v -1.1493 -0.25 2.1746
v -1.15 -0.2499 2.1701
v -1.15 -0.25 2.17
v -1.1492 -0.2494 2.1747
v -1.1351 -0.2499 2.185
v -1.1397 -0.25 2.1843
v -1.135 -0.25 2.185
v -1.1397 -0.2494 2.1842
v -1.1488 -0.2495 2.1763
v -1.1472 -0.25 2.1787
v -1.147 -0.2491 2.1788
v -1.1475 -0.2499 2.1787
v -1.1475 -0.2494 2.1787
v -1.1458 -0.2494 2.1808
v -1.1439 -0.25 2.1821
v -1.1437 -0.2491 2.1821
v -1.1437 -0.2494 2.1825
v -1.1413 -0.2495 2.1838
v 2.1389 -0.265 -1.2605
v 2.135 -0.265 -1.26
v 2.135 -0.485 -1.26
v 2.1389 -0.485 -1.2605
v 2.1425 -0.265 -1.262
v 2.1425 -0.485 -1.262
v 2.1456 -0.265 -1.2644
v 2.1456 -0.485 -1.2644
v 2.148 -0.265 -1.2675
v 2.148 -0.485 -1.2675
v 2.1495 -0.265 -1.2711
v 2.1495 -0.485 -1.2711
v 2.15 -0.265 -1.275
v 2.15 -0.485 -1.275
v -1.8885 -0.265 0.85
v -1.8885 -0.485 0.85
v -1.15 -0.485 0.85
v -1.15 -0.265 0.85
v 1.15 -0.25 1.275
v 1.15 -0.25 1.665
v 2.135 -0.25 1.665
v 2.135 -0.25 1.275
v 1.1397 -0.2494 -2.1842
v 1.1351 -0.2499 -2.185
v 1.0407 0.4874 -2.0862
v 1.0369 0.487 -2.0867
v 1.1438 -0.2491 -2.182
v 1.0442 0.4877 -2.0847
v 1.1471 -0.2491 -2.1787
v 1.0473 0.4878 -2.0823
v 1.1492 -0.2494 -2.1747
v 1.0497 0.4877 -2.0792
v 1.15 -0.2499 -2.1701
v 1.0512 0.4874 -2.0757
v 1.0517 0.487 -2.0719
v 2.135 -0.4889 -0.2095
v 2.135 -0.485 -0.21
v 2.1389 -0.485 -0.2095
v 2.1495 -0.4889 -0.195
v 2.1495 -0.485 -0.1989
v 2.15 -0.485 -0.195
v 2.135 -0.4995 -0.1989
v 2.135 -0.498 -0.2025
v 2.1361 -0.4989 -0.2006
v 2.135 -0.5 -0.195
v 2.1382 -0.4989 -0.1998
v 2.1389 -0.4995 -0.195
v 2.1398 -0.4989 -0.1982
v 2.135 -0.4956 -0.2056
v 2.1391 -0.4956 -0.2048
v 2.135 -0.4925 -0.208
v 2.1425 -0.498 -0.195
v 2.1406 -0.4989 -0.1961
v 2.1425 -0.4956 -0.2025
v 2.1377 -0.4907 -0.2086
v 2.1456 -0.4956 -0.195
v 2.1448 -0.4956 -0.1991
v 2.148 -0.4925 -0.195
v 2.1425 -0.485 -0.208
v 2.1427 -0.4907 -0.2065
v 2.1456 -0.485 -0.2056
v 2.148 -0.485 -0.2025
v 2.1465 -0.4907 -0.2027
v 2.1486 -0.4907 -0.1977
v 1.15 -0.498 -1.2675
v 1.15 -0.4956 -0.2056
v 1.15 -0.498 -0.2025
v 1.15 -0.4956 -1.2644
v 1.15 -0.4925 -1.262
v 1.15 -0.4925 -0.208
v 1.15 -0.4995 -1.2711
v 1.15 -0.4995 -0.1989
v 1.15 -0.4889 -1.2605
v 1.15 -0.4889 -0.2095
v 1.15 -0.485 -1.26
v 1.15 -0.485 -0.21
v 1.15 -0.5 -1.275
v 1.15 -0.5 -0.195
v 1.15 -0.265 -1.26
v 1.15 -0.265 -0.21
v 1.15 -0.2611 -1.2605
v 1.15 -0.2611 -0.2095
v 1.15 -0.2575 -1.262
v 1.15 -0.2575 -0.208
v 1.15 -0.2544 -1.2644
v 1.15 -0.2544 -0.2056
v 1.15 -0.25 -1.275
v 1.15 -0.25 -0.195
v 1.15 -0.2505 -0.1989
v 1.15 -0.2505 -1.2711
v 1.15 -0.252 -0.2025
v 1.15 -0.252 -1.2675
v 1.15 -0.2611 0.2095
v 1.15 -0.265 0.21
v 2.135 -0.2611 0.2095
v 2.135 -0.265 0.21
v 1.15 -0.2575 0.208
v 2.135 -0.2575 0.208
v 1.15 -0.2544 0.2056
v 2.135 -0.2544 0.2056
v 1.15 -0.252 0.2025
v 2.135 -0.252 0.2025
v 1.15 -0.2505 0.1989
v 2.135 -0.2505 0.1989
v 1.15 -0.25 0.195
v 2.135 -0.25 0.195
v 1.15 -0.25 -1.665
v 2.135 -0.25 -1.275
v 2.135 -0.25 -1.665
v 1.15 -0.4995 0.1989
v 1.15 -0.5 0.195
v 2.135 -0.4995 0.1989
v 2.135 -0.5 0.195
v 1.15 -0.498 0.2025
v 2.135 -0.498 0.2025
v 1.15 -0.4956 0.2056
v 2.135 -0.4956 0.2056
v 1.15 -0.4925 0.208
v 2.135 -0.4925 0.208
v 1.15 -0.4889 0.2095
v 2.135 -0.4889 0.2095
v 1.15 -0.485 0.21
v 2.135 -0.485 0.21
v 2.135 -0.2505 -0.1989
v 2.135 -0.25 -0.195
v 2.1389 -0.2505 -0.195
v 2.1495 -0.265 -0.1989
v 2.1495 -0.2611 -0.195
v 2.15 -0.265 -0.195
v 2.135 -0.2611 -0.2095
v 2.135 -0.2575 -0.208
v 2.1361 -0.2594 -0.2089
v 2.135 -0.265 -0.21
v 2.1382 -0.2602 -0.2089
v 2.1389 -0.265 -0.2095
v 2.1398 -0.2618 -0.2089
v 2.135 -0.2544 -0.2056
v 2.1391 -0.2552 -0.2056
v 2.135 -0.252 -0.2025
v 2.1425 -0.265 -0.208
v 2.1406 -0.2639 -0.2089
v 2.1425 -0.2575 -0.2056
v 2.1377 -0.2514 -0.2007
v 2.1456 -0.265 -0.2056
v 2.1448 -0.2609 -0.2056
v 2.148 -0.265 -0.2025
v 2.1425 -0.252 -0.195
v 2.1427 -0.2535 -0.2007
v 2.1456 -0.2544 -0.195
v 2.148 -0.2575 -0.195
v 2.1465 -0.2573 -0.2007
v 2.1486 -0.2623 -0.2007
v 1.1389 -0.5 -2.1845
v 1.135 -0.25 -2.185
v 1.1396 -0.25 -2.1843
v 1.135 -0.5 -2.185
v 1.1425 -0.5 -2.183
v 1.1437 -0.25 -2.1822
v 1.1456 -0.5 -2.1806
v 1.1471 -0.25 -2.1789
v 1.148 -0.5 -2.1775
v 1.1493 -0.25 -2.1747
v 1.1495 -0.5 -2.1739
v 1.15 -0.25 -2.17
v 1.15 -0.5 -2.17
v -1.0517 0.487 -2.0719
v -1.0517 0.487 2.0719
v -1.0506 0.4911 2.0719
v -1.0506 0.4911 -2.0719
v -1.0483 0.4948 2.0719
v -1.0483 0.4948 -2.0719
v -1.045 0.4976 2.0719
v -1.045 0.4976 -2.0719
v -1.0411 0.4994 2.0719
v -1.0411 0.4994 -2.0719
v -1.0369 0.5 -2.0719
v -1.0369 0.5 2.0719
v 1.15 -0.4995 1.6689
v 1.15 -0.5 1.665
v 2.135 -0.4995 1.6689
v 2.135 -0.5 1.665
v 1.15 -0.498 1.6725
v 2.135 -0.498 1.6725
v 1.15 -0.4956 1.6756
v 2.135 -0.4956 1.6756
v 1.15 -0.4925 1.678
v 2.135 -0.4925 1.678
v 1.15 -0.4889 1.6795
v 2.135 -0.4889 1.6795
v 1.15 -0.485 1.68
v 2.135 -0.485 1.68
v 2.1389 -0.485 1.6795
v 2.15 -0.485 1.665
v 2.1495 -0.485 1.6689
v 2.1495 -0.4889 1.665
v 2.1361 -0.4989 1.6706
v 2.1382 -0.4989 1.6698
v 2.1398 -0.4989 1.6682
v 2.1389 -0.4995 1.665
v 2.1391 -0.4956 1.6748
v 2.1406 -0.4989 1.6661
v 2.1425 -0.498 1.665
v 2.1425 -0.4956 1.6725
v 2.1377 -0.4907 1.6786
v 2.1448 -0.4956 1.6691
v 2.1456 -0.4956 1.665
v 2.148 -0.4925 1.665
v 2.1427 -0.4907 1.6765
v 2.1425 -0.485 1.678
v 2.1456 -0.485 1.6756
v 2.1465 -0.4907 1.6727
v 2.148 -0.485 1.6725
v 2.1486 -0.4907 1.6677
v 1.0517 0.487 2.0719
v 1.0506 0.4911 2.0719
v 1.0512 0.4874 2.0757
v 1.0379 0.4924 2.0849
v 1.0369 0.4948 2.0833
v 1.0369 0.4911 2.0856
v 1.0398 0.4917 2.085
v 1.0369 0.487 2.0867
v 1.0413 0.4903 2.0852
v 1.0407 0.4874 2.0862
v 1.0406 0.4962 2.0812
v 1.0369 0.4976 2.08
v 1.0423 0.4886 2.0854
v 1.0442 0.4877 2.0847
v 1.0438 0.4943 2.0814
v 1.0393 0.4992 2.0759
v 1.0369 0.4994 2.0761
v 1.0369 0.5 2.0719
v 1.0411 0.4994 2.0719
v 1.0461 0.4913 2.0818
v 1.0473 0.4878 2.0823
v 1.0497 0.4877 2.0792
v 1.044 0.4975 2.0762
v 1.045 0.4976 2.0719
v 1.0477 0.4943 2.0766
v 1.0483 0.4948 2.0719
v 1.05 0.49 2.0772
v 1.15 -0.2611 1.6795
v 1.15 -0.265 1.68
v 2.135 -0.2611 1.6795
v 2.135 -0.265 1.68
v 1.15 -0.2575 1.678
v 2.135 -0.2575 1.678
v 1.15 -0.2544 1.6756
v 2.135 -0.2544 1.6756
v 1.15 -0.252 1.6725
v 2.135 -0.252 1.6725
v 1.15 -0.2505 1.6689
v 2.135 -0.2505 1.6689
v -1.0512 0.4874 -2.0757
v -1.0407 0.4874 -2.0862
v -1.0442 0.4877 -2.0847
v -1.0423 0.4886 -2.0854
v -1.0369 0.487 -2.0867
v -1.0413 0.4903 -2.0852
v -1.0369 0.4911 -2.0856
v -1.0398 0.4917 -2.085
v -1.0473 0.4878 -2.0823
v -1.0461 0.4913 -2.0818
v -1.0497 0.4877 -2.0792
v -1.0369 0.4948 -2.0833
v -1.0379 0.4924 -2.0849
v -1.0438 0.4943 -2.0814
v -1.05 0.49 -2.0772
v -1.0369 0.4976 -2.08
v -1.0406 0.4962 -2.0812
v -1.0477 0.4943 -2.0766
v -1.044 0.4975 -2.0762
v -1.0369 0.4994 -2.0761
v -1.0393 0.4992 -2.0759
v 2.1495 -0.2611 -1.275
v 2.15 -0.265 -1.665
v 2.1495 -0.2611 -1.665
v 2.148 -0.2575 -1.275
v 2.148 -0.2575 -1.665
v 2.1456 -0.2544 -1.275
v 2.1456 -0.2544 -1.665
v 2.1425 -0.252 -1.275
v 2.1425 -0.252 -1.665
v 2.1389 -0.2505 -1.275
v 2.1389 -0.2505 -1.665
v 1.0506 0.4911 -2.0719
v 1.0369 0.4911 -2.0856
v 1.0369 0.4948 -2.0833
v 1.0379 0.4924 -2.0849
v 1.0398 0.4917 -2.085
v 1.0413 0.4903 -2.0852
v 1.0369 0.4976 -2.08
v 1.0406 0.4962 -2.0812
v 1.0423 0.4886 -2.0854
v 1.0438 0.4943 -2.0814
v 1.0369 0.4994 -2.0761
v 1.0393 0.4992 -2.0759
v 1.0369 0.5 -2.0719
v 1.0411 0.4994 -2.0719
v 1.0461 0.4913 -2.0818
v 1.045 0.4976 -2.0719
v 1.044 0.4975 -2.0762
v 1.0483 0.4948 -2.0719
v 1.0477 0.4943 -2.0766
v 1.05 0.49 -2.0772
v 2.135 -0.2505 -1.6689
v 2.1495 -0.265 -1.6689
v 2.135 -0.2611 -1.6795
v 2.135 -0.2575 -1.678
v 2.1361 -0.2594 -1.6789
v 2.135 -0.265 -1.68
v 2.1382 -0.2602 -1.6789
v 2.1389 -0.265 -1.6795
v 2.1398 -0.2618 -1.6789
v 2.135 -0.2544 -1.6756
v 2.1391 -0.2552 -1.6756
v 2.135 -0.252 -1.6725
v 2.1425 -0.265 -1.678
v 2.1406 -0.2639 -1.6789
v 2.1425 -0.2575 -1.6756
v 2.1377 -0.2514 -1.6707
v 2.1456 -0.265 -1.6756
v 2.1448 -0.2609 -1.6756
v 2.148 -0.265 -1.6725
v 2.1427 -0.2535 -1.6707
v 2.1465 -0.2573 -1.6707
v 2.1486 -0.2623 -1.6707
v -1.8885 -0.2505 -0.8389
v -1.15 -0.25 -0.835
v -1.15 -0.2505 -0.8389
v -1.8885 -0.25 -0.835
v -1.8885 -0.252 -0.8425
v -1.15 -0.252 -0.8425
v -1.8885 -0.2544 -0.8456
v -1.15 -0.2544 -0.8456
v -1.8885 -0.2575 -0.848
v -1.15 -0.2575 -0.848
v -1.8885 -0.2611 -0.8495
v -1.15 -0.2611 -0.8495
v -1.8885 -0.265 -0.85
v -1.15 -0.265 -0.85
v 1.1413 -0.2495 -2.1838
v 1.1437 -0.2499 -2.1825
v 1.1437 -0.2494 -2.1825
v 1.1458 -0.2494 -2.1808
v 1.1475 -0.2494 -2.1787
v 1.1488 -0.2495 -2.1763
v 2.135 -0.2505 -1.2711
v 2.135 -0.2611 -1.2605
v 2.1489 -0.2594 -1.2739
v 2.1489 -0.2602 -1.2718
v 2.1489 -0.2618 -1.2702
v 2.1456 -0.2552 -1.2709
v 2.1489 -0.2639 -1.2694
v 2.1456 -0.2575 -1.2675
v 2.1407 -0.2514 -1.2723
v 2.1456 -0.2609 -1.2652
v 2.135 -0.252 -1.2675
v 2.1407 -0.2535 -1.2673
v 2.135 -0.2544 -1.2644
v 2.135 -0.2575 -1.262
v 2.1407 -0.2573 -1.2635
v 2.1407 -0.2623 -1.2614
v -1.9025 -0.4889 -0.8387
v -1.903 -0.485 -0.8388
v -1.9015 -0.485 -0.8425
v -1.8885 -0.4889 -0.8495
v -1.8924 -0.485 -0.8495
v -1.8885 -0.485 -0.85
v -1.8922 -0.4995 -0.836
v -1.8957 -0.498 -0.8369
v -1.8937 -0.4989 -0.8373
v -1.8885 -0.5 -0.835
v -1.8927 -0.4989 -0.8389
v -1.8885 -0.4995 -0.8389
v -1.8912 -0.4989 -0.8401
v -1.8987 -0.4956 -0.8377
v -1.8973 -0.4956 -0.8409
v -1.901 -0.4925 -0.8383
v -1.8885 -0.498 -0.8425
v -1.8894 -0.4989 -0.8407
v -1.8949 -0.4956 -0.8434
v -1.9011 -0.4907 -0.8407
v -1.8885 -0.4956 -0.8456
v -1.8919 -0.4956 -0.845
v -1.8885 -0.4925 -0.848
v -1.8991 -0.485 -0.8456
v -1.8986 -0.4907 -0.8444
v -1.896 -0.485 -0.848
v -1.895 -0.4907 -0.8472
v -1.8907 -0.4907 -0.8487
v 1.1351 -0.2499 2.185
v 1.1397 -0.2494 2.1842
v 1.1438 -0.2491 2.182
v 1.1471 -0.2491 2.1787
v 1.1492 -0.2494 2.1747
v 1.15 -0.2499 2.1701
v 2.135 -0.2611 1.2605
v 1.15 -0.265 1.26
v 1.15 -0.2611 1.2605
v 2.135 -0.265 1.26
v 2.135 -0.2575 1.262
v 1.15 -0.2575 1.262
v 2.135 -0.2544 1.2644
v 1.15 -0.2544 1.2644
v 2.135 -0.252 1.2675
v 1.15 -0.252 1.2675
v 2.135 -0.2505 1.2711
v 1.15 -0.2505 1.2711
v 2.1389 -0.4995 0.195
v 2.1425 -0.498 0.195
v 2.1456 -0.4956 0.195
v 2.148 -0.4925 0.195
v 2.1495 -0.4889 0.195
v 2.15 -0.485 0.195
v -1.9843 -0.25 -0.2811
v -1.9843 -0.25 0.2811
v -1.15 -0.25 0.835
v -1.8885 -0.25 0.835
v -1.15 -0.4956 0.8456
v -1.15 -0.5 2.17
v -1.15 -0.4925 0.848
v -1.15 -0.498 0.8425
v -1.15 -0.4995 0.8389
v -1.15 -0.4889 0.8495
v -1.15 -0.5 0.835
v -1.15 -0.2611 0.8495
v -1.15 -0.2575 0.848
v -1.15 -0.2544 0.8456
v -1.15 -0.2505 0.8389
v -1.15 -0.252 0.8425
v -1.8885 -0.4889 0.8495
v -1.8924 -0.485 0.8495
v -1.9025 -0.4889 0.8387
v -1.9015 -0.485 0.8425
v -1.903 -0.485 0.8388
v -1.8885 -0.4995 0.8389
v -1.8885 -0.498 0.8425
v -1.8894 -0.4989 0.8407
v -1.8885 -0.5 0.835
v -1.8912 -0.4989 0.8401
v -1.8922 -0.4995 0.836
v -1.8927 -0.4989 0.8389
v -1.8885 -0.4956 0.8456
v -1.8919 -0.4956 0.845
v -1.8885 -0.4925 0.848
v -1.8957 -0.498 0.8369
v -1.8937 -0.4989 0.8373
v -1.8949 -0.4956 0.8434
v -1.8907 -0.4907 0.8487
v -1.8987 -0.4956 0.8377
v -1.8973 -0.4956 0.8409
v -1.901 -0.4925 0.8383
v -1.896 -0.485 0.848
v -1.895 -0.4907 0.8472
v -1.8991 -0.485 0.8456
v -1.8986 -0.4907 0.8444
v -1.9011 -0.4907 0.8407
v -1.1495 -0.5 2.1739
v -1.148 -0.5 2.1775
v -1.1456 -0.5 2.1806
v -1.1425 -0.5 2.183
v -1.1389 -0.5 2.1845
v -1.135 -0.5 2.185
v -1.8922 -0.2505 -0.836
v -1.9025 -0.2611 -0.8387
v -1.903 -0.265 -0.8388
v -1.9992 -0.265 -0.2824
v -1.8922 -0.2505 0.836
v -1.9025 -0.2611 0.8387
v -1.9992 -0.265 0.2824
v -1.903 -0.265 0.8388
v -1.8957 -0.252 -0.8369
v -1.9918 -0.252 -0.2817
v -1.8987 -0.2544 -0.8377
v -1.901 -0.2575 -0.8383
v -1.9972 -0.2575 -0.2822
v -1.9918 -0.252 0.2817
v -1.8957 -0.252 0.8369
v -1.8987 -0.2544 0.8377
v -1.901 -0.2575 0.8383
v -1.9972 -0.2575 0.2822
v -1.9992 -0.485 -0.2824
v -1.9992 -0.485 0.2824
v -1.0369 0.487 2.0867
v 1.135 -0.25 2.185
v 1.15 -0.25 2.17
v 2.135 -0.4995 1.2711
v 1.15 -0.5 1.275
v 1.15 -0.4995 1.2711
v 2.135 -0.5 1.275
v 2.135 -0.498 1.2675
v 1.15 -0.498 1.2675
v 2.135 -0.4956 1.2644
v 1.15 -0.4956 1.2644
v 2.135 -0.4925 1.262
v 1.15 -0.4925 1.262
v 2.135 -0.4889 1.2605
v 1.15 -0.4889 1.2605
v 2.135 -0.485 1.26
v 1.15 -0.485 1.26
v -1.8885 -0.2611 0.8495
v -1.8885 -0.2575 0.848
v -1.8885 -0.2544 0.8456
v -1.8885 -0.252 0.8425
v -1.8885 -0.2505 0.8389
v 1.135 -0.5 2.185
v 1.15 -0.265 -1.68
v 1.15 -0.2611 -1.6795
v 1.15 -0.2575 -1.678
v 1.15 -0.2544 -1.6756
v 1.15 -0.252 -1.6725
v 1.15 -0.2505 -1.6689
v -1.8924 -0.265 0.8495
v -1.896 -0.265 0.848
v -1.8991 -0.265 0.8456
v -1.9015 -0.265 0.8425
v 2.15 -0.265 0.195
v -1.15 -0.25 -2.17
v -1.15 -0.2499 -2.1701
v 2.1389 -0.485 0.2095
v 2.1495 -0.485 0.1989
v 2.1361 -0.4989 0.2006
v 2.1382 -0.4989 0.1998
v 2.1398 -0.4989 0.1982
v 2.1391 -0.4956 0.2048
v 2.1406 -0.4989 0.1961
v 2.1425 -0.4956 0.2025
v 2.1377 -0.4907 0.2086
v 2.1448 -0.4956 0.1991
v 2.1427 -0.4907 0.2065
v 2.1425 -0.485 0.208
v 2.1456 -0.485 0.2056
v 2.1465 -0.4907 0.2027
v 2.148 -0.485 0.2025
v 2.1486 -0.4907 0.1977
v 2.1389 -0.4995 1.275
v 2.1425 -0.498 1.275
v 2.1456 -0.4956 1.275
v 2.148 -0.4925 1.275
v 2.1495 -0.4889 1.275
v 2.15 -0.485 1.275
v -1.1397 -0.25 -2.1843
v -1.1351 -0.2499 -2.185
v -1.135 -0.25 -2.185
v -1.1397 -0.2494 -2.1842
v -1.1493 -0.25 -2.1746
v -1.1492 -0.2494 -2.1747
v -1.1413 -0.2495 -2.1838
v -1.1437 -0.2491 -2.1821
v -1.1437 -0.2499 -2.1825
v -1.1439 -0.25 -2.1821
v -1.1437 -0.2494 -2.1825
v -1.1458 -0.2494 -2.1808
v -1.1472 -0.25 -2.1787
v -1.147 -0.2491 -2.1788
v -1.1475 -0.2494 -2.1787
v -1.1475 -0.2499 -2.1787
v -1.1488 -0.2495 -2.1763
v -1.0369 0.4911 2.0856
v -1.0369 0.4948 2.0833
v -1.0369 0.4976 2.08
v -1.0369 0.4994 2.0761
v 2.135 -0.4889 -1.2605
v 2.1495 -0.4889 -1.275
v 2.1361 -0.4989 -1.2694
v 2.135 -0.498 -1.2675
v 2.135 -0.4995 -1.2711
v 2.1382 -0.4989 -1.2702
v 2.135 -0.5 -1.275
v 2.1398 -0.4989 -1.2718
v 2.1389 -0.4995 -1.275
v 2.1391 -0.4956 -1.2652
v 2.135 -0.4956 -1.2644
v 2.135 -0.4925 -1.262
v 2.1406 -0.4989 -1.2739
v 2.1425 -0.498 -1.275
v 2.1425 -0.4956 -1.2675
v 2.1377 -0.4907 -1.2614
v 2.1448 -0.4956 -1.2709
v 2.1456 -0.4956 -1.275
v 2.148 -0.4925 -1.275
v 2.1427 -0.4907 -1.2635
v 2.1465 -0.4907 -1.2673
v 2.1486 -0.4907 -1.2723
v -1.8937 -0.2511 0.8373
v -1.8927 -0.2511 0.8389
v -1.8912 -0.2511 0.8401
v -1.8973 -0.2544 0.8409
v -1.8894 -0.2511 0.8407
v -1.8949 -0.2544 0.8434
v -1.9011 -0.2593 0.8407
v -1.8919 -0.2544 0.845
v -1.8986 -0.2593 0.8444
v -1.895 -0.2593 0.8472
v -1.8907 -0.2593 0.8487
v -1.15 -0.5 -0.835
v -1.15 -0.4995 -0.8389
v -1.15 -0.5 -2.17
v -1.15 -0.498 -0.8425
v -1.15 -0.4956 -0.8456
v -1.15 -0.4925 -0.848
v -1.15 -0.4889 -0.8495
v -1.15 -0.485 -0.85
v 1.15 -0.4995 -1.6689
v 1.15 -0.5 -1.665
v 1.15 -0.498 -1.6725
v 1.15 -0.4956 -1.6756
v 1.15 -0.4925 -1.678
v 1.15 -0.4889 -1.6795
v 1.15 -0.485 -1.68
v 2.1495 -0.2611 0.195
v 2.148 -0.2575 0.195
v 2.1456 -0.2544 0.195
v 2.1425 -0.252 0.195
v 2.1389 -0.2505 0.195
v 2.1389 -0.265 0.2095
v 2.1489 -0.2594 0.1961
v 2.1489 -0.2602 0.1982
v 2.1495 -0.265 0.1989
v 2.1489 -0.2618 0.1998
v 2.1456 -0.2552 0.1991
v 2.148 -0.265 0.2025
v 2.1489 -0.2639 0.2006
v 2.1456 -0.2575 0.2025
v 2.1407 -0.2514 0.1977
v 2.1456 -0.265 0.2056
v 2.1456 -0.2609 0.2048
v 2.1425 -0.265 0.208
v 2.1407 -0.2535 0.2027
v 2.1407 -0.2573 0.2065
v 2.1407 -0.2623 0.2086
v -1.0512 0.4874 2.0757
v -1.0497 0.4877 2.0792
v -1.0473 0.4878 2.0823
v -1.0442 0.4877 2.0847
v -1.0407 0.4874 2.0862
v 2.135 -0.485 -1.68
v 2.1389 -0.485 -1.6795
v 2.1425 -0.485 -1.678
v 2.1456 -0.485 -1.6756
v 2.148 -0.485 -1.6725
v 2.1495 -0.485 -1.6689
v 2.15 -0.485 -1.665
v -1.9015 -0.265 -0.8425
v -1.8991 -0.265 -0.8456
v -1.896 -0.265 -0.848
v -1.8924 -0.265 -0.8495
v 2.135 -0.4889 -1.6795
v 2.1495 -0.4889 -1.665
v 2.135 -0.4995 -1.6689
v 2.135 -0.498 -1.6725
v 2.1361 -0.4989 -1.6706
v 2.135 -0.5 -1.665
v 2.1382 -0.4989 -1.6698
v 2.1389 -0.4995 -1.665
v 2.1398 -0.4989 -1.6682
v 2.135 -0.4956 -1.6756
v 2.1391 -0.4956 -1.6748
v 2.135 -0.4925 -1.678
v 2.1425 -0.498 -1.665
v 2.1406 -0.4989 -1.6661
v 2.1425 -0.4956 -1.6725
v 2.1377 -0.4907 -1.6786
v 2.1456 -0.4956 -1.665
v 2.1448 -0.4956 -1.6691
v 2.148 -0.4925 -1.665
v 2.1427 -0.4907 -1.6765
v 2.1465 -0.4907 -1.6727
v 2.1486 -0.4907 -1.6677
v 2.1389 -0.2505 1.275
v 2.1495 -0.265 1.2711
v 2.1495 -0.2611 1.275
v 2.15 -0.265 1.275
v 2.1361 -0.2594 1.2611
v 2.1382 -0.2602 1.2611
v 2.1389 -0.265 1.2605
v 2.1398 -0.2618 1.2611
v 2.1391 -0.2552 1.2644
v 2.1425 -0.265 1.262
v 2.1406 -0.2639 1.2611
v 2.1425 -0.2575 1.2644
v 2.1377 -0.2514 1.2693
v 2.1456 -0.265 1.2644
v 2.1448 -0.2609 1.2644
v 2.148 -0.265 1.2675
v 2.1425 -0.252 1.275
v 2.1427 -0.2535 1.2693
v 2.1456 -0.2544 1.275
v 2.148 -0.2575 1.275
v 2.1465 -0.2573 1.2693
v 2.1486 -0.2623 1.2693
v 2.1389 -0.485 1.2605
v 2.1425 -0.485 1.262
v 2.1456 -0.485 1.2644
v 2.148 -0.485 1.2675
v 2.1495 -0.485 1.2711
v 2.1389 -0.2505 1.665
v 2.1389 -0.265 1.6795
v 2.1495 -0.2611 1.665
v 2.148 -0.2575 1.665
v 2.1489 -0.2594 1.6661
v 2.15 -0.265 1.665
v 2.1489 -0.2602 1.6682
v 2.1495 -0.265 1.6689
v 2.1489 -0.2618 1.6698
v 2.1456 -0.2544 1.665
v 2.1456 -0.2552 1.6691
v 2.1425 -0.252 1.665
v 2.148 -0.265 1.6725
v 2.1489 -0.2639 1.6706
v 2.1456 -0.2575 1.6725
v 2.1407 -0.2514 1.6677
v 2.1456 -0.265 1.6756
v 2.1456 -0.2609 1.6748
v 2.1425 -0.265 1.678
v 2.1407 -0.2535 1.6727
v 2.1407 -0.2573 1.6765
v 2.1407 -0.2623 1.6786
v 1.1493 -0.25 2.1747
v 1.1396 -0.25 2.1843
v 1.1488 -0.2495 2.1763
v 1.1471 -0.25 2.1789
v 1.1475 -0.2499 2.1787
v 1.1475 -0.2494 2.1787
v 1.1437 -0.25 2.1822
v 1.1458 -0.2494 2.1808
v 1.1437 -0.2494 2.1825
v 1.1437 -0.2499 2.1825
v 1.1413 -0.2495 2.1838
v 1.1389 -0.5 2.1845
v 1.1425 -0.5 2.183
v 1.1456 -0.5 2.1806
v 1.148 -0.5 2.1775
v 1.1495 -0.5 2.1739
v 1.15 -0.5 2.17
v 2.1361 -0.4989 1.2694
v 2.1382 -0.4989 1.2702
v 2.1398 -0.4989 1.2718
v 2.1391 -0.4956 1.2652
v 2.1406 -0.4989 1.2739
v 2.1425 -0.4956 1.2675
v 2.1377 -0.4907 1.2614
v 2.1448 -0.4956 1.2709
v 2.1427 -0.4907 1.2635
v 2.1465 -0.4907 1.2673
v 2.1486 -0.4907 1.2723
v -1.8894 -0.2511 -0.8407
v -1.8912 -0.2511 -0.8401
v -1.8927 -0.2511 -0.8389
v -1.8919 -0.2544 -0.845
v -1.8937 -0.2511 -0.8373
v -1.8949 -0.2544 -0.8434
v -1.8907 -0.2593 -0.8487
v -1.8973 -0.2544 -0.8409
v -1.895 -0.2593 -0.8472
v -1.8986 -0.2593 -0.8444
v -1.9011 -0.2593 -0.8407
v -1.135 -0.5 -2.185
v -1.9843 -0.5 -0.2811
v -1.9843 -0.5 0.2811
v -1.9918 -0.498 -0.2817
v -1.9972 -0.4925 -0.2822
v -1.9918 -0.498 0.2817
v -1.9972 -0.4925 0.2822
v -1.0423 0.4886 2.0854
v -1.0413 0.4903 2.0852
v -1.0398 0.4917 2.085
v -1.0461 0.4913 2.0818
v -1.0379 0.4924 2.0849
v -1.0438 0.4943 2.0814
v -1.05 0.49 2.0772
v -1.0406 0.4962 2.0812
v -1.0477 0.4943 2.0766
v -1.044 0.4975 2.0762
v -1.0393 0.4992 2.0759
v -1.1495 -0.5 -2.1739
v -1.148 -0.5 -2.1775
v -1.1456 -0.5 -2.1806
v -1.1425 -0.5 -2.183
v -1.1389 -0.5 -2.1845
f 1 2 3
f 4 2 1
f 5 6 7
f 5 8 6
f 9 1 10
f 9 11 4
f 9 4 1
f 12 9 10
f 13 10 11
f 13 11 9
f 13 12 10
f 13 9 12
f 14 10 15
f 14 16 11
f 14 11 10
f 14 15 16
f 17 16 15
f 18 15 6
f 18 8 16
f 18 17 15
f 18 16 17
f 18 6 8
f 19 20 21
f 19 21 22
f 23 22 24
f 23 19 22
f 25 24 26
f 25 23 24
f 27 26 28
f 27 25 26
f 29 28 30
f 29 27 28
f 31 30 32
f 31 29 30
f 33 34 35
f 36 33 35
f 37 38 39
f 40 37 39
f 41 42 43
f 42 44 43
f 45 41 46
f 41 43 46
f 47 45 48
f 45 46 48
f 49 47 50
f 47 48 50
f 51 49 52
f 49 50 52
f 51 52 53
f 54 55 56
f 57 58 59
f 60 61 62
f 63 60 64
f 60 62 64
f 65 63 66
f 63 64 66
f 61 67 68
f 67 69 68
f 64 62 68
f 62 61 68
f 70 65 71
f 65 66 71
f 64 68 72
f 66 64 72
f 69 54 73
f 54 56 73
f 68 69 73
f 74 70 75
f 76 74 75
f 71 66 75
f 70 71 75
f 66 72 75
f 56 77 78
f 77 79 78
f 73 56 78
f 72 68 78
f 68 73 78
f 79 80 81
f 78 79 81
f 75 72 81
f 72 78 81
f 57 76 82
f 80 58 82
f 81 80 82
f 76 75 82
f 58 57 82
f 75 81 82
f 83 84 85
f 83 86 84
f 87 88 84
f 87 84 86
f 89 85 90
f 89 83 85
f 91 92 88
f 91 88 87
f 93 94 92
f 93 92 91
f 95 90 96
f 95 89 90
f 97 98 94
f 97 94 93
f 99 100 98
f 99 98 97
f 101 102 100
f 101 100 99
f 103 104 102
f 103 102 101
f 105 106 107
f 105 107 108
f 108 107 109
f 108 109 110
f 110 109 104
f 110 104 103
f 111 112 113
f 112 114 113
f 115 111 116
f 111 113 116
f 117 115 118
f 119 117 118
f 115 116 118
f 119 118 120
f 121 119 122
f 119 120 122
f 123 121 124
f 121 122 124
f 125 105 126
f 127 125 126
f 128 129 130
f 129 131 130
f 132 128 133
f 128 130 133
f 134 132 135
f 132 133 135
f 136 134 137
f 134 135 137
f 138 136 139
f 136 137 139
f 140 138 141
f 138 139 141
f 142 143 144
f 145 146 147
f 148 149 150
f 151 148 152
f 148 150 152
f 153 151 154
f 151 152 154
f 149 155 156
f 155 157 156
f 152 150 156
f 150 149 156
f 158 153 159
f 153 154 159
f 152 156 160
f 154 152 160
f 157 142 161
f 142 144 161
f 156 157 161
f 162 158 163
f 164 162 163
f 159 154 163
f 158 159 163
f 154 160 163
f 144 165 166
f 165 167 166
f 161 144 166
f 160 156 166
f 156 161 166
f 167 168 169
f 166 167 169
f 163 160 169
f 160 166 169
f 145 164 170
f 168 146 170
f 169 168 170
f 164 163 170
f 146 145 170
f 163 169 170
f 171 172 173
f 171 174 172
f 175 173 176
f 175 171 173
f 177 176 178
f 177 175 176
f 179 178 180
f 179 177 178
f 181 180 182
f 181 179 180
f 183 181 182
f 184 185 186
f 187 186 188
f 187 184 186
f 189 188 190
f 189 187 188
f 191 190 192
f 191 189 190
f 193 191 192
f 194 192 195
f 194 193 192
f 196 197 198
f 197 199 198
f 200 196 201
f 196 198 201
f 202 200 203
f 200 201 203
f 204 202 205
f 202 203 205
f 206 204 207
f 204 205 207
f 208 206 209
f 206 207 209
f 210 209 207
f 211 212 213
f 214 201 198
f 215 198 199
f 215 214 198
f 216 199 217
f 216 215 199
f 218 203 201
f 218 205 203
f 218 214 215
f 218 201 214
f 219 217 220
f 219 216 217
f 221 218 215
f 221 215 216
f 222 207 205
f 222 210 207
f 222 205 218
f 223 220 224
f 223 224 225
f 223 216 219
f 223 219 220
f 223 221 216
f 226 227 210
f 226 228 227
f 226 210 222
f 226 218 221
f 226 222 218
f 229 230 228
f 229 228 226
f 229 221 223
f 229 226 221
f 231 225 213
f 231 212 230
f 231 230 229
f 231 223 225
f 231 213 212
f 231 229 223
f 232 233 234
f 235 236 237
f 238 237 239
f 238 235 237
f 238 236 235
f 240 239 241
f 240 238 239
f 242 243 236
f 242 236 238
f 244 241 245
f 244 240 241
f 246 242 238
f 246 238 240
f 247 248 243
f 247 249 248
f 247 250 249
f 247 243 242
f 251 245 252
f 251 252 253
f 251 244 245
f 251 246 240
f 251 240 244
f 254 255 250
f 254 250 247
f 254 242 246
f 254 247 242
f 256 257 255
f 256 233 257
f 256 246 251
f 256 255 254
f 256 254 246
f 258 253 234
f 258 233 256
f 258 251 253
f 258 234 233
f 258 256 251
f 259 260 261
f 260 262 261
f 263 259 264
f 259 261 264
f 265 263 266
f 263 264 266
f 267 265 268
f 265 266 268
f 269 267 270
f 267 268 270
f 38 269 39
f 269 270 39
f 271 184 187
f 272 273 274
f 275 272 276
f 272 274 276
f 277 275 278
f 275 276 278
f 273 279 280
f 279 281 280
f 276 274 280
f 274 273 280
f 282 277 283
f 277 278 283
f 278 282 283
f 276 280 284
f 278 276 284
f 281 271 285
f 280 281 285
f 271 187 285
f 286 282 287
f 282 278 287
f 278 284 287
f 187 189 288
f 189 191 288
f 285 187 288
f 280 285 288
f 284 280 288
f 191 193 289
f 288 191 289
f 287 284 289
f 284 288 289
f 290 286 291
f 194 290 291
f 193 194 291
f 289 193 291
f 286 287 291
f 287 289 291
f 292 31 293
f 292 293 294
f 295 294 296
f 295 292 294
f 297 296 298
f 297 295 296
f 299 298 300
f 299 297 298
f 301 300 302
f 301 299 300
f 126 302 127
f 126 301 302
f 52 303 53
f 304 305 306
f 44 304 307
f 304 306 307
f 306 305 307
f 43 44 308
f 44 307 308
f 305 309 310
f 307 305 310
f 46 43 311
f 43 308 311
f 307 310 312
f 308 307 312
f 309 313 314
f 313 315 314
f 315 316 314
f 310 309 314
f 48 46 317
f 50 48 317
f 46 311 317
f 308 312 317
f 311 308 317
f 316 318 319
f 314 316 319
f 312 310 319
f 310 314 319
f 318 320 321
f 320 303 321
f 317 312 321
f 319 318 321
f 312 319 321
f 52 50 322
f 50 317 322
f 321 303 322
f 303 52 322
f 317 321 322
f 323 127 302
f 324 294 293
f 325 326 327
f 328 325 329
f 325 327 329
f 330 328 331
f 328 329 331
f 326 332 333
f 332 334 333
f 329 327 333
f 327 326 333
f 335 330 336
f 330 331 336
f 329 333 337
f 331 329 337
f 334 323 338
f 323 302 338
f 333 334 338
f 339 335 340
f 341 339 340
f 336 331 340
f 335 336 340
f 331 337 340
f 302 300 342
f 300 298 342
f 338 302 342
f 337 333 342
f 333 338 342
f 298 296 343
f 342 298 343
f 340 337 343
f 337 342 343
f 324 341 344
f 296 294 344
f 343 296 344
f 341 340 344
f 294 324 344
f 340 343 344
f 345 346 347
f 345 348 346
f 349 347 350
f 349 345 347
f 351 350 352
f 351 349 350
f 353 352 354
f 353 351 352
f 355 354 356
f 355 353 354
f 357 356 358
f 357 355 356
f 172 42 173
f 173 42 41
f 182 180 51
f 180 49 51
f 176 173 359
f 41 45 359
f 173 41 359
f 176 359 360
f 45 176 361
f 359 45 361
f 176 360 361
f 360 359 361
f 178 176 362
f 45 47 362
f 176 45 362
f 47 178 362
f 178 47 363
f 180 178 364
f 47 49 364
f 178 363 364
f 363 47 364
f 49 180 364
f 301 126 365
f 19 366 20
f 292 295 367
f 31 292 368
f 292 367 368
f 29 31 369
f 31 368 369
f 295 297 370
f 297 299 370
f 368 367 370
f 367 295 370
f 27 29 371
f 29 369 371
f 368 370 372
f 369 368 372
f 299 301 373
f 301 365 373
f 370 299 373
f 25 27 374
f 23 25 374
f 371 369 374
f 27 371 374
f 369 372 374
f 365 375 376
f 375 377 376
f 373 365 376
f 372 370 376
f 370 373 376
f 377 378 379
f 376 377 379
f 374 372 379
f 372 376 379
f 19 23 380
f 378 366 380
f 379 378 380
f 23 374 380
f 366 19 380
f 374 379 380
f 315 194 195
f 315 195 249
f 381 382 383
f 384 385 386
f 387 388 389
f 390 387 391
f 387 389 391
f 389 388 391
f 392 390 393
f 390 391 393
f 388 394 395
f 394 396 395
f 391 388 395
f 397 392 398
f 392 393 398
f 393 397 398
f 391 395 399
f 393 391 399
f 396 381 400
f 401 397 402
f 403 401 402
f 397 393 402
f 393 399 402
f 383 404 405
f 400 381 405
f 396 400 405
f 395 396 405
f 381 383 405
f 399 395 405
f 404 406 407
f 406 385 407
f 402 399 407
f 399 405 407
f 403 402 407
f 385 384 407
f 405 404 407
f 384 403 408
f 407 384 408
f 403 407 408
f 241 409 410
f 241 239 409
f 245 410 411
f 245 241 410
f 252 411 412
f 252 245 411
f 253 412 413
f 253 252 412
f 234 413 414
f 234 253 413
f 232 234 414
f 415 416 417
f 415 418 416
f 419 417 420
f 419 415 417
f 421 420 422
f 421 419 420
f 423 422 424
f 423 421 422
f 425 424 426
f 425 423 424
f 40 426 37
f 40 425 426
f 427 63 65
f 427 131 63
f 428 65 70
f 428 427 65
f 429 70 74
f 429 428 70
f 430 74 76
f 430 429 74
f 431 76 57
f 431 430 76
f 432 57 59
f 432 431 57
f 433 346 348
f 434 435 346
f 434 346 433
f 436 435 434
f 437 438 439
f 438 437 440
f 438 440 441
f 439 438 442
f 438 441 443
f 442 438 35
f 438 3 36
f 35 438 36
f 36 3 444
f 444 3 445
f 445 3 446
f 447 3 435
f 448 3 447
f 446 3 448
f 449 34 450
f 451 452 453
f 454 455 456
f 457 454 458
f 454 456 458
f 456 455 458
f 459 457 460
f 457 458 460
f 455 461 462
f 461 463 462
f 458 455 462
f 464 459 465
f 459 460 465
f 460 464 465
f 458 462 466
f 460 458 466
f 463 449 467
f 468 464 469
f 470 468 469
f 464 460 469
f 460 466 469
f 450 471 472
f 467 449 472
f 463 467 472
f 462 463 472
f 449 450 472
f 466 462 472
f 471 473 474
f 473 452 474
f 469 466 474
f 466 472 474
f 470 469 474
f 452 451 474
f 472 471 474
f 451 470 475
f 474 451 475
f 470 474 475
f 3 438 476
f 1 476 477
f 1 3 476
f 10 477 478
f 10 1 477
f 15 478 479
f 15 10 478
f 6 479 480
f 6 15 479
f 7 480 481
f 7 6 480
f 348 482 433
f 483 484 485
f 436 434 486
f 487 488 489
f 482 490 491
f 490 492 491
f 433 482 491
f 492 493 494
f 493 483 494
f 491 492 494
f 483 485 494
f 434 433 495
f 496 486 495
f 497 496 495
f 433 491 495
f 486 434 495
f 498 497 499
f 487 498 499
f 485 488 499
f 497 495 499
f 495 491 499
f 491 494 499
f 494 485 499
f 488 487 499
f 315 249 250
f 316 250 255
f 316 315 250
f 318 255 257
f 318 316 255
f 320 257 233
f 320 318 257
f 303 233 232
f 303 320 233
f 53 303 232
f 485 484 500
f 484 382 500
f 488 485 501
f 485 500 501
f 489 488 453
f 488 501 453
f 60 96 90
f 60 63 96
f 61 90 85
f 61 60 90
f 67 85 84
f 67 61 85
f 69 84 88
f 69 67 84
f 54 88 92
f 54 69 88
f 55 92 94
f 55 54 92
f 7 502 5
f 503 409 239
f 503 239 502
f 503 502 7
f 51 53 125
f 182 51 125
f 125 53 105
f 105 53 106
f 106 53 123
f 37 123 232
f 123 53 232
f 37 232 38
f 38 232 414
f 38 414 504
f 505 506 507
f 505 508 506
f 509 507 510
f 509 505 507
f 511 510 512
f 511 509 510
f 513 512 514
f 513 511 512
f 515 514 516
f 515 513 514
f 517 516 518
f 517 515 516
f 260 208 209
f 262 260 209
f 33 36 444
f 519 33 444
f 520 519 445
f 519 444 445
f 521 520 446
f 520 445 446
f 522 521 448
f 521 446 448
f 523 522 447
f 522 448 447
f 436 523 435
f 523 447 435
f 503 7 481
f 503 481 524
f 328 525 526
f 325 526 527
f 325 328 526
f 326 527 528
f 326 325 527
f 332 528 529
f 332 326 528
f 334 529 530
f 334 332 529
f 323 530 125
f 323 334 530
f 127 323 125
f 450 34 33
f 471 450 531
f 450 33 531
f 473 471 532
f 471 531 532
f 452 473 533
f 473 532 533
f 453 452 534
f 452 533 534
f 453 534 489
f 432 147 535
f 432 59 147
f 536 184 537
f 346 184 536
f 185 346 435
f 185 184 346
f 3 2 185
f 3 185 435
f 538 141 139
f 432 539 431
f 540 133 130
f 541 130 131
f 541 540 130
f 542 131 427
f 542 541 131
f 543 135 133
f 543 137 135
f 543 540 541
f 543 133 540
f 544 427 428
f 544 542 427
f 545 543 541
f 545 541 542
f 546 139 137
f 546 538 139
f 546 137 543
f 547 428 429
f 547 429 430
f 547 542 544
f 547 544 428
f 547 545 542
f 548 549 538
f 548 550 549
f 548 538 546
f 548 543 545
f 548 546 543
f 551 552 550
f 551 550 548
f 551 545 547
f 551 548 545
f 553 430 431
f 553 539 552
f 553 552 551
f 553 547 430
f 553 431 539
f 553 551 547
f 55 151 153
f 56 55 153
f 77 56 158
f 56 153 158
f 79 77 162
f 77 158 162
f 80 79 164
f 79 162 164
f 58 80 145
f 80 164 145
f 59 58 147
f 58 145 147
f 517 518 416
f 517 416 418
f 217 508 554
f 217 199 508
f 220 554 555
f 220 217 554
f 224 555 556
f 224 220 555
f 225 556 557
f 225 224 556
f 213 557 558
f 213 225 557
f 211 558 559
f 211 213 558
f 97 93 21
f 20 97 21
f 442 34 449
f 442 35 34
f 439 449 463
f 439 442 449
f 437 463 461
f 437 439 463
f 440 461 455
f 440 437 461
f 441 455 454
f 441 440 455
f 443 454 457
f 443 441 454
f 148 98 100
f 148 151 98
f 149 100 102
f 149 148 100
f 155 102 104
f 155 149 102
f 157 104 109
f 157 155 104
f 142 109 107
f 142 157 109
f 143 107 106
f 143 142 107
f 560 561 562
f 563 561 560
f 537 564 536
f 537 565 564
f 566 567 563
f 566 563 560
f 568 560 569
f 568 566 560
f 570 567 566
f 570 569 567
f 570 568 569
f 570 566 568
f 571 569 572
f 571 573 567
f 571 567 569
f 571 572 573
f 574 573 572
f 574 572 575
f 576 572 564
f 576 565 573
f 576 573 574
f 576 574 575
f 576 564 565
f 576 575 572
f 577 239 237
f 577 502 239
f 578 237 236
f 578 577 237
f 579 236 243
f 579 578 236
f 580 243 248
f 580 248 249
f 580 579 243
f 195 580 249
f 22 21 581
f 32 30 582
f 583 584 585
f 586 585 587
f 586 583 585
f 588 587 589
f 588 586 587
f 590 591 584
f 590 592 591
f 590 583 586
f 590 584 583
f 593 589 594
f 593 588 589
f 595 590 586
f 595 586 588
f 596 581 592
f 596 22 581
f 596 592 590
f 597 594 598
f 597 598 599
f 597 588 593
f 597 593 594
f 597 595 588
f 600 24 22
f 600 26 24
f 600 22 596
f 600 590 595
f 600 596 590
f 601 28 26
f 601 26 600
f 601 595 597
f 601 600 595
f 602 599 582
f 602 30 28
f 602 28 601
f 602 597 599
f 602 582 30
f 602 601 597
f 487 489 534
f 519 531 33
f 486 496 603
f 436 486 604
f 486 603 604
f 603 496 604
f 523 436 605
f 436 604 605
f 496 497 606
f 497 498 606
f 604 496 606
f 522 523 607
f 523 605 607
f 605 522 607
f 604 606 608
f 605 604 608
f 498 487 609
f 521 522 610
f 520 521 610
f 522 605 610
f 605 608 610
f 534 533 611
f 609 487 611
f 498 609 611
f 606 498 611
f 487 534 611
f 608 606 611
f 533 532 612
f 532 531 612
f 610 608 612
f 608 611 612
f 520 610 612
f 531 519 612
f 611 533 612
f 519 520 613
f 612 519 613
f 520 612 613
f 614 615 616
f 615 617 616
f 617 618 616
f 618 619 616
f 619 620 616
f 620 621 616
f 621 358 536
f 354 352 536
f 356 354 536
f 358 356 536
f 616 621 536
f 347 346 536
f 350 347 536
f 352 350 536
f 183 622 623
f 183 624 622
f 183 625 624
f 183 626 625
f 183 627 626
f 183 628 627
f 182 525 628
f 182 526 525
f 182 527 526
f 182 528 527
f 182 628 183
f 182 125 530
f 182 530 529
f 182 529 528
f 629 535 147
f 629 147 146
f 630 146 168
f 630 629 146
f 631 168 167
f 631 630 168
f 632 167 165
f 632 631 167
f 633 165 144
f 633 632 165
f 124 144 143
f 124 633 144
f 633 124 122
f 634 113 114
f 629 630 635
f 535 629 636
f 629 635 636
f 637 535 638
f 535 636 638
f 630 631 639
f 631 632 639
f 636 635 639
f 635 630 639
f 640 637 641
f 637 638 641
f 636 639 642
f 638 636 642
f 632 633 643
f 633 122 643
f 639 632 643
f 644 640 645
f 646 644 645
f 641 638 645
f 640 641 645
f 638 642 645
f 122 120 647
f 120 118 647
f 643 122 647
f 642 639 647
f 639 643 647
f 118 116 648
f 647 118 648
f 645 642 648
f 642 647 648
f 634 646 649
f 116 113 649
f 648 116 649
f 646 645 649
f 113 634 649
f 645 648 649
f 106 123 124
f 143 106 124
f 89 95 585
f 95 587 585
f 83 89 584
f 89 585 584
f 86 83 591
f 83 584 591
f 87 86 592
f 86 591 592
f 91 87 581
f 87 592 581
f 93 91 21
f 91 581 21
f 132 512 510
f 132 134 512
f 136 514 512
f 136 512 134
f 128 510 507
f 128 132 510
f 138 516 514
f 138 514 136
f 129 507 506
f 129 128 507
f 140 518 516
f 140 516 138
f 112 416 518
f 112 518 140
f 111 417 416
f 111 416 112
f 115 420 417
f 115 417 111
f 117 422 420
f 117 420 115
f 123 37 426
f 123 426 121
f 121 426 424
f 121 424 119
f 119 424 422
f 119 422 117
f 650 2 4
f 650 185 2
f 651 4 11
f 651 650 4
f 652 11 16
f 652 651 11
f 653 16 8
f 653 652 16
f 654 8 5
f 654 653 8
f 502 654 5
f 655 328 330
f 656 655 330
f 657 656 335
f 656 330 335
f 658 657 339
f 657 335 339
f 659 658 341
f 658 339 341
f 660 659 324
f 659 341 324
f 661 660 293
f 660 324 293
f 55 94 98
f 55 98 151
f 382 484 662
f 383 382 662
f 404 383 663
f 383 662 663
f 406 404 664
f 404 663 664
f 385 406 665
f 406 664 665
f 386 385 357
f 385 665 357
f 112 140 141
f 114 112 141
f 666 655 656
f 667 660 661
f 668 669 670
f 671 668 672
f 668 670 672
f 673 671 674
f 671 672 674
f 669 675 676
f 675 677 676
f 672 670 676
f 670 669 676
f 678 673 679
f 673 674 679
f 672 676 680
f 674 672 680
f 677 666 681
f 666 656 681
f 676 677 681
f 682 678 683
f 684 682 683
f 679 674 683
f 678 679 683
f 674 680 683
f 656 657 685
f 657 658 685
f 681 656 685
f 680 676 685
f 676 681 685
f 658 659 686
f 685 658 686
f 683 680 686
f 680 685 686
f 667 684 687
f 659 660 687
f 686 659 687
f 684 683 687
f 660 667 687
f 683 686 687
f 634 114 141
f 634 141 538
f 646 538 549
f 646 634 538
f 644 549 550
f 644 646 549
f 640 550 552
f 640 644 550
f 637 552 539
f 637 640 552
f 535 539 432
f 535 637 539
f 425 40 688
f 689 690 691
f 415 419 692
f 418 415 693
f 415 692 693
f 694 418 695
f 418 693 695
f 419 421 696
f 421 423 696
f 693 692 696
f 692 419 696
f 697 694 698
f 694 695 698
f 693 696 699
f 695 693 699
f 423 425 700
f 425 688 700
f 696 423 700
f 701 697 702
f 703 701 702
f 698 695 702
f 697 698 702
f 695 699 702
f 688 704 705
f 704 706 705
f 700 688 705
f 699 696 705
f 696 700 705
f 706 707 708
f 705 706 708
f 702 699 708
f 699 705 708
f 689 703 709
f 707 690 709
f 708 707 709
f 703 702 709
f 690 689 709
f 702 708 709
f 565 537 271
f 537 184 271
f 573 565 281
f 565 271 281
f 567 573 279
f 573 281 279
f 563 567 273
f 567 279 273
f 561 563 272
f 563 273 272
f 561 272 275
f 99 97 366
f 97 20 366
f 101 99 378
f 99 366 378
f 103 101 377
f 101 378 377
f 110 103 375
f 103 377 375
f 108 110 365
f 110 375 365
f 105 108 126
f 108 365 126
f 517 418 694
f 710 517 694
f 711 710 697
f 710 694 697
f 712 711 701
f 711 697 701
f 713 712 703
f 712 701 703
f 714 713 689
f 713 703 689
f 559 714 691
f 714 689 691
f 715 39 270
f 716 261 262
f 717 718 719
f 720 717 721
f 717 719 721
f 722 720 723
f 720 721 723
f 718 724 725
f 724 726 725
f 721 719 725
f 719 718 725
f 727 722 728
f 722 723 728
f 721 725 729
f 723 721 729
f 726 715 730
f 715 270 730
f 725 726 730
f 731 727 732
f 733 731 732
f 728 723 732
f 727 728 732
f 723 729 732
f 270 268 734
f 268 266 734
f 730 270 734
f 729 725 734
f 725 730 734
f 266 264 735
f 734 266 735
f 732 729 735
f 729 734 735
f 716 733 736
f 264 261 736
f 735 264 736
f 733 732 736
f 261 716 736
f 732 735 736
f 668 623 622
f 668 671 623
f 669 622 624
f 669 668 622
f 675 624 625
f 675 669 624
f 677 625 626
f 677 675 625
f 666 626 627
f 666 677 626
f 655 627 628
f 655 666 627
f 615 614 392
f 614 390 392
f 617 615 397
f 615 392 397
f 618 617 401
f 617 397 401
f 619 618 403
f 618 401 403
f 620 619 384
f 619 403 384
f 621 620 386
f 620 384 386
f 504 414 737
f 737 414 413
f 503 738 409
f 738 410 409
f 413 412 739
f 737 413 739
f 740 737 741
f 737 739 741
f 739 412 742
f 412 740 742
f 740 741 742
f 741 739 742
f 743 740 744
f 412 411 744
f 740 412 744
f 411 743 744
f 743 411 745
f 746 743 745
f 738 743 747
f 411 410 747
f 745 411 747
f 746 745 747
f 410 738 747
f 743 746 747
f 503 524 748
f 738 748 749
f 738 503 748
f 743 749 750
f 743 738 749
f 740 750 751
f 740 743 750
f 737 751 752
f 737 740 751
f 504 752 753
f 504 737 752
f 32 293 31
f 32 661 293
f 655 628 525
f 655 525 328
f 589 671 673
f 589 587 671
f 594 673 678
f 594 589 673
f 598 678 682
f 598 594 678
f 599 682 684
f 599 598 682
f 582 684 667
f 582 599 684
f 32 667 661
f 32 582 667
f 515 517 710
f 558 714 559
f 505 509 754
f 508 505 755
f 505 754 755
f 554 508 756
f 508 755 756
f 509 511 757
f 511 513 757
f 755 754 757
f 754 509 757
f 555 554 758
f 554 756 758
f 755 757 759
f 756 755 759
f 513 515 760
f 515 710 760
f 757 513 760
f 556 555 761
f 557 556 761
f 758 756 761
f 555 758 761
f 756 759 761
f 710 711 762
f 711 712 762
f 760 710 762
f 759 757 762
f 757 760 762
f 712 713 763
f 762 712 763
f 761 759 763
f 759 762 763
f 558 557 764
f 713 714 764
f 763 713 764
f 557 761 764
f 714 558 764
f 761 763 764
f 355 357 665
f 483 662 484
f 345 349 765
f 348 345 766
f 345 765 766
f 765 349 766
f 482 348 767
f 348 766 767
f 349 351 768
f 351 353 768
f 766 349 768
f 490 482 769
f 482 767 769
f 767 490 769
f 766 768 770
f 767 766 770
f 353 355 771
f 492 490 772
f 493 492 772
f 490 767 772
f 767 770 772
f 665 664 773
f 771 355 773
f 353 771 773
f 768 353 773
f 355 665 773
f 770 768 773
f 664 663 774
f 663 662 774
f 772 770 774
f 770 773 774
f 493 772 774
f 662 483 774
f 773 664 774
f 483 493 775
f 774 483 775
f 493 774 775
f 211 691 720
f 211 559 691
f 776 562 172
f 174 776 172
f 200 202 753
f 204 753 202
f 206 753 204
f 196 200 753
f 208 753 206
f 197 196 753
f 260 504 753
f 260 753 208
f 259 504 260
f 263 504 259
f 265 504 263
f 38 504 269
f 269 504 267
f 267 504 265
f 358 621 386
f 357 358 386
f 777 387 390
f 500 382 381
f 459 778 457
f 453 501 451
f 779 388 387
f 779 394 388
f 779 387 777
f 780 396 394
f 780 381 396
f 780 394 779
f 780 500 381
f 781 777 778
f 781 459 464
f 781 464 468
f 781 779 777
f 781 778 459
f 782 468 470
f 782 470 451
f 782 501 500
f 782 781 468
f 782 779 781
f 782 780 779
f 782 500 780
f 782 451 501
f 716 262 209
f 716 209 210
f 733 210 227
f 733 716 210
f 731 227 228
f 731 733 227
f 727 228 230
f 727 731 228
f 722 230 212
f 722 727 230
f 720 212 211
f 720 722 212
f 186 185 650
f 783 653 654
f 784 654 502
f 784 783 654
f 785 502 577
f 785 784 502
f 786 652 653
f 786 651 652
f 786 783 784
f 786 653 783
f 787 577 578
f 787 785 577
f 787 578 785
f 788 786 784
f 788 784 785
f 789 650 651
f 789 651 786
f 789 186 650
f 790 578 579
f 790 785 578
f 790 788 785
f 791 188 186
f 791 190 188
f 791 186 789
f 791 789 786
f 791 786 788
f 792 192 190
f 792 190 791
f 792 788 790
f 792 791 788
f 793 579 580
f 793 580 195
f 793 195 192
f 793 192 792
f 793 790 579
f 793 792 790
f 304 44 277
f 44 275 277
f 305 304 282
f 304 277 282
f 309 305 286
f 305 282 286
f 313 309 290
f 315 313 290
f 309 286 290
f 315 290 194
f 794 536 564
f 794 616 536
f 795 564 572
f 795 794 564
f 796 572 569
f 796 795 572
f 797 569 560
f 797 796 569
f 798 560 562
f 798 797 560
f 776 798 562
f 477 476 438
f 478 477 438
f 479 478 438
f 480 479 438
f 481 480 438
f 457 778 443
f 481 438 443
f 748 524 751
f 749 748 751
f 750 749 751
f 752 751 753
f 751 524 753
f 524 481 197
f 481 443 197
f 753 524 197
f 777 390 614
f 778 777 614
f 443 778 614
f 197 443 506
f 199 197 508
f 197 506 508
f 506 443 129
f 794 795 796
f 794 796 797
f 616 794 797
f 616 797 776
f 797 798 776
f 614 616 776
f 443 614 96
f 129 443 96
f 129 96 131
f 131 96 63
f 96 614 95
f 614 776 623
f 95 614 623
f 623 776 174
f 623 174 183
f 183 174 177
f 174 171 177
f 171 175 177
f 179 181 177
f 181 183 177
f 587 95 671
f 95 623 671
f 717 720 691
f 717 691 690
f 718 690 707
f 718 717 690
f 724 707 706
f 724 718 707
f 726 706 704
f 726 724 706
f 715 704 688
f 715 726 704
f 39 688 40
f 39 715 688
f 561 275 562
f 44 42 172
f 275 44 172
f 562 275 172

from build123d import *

# Parameters (mm, degrees)
SKETCH1_W           = 2.3
SKETCH1_H           = 4.37
BOSS_EXTRUDE1_DEPTH = 0.5
CUT_EXTRUDE1_DEPTH  = 5.546361182
CUT_EXTRUDE2_DEPTH  = 4.211576716
FILLET1_R           = 0.015
SKETCH6_W           = 1
SKETCH6_H           = 0.42
BOSS_EXTRUDE2_DEPTH = 0.25
FILLET2_R           = 0.015


with BuildPart() as part:
    # Sketch1 → Boss-Extrude1 (new, symmetric)
    with BuildSketch(Plane(origin=(0, 0, 0), x_dir=(1, 0, 0), z_dir=(0, 1, 0))):
        Rectangle(SKETCH1_W, SKETCH1_H)
    extrude(amount=BOSS_EXTRUDE1_DEPTH, both=True)

    # Sketch2 → Cut-Extrude1 (cut, through all)
    with BuildSketch(Plane.XY.offset(2.185)):
        Polygon((-1.15, -0.25), (-1.15, 0.5), (-1.05, 0.5), align=None)
        Polygon((1.05, 0.5), (1.15, -0.25), (1.15, 0.5), align=None)
    extrude(amount=-CUT_EXTRUDE1_DEPTH, mode=Mode.SUBTRACT)

    # Sketch3 → Cut-Extrude2 (cut, through all)
    with BuildSketch(Plane(origin=(1.15, 0, 0), x_dir=(0, 0, -1), z_dir=(1, 0, 0))):
        Polygon((-2.185, -0.25), (-2.185, 0.5), (-2.085, 0.5), align=None)
        Polygon((2.085, 0.5), (2.185, -0.25), (2.185, 0.5), align=None)
    extrude(amount=-CUT_EXTRUDE2_DEPTH, mode=Mode.SUBTRACT)

    # Fillet1
    fillet1_edges = [part.edges().sort_by_distance(p)[0] for p in [
        (1.15, -0.375, 2.185),
        (-1.15, -0.375, 2.185),
        (-1.15, -0.375, -2.185),
        (1.15, -0.375, -2.185),
        (-1.05, 0.5, 0),
        (-1.1, 0.125, -2.135),
        (-1.1, 0.125, 2.135),
        (1.05, 0.5, 0),
        (0, 0.5, 2.085),
        (1.1, 0.125, 2.135),
        (0, 0.5, -2.085),
        (1.1, 0.125, -2.135),
    ]]
    fillet(fillet1_edges, radius=FILLET1_R)

    # Sketch6 → Boss-Extrude2 (add)
    with BuildSketch(Plane.XZ.offset(0.5)):
        with Locations((1.65, 1.47)):
            Rectangle(SKETCH6_W, SKETCH6_H)
        with Locations((1.65, 0)):
            Rectangle(SKETCH6_W, SKETCH6_H)
        with Locations((1.65, -1.47)):
            Rectangle(SKETCH6_W, SKETCH6_H)
        with BuildLine():
            Line((-1.9, 0.85), (-1.15, 0.85))
            Line((-1.15, 0.85), (-1.15, -0.85))
            Line((-1.15, -0.85), (-1.9, -0.85))
            ThreePointArc((-1.9, -0.85), (-2.011348247, 0), (-1.9, 0.85))
        make_face()
    extrude(amount=-BOSS_EXTRUDE2_DEPTH)

    # Fillet2
    fillet2_edges = [part.edges().sort_by_distance(p)[0] for p in [
        (-1.525, -0.25, -0.85),
        (-2.011348247, -0.25, 0),
        (-1.9, -0.375, -0.85),
        (-1.525, -0.25, 0.85),
        (-1.9, -0.375, 0.85),
        (-1.525, -0.5, 0.85),
        (-2.011348247, -0.5, 0),
        (-1.525, -0.5, -0.85),
        (1.65, -0.25, 1.68),
        (2.15, -0.25, 1.47),
        (2.15, -0.375, 1.68),
        (1.65, -0.25, 1.26),
        (2.15, -0.375, 1.26),
        (1.65, -0.5, 1.68),
        (1.65, -0.5, 1.26),
        (2.15, -0.5, 1.47),
        (1.65, -0.25, 0.21),
        (2.15, -0.25, 0),
        (2.15, -0.375, 0.21),
        (1.65, -0.25, -0.21),
        (2.15, -0.375, -0.21),
        (1.65, -0.5, 0.21),
        (1.65, -0.5, -0.21),
        (2.15, -0.5, 0),
        (1.65, -0.25, -1.26),
        (2.15, -0.25, -1.47),
        (2.15, -0.375, -1.26),
        (1.65, -0.25, -1.68),
        (2.15, -0.375, -1.68),
        (1.65, -0.5, -1.26),
        (1.65, -0.5, -1.68),
        (2.15, -0.5, -1.47),
    ]]
    fillet(fillet2_edges, radius=FILLET2_R)


solid = part.part
